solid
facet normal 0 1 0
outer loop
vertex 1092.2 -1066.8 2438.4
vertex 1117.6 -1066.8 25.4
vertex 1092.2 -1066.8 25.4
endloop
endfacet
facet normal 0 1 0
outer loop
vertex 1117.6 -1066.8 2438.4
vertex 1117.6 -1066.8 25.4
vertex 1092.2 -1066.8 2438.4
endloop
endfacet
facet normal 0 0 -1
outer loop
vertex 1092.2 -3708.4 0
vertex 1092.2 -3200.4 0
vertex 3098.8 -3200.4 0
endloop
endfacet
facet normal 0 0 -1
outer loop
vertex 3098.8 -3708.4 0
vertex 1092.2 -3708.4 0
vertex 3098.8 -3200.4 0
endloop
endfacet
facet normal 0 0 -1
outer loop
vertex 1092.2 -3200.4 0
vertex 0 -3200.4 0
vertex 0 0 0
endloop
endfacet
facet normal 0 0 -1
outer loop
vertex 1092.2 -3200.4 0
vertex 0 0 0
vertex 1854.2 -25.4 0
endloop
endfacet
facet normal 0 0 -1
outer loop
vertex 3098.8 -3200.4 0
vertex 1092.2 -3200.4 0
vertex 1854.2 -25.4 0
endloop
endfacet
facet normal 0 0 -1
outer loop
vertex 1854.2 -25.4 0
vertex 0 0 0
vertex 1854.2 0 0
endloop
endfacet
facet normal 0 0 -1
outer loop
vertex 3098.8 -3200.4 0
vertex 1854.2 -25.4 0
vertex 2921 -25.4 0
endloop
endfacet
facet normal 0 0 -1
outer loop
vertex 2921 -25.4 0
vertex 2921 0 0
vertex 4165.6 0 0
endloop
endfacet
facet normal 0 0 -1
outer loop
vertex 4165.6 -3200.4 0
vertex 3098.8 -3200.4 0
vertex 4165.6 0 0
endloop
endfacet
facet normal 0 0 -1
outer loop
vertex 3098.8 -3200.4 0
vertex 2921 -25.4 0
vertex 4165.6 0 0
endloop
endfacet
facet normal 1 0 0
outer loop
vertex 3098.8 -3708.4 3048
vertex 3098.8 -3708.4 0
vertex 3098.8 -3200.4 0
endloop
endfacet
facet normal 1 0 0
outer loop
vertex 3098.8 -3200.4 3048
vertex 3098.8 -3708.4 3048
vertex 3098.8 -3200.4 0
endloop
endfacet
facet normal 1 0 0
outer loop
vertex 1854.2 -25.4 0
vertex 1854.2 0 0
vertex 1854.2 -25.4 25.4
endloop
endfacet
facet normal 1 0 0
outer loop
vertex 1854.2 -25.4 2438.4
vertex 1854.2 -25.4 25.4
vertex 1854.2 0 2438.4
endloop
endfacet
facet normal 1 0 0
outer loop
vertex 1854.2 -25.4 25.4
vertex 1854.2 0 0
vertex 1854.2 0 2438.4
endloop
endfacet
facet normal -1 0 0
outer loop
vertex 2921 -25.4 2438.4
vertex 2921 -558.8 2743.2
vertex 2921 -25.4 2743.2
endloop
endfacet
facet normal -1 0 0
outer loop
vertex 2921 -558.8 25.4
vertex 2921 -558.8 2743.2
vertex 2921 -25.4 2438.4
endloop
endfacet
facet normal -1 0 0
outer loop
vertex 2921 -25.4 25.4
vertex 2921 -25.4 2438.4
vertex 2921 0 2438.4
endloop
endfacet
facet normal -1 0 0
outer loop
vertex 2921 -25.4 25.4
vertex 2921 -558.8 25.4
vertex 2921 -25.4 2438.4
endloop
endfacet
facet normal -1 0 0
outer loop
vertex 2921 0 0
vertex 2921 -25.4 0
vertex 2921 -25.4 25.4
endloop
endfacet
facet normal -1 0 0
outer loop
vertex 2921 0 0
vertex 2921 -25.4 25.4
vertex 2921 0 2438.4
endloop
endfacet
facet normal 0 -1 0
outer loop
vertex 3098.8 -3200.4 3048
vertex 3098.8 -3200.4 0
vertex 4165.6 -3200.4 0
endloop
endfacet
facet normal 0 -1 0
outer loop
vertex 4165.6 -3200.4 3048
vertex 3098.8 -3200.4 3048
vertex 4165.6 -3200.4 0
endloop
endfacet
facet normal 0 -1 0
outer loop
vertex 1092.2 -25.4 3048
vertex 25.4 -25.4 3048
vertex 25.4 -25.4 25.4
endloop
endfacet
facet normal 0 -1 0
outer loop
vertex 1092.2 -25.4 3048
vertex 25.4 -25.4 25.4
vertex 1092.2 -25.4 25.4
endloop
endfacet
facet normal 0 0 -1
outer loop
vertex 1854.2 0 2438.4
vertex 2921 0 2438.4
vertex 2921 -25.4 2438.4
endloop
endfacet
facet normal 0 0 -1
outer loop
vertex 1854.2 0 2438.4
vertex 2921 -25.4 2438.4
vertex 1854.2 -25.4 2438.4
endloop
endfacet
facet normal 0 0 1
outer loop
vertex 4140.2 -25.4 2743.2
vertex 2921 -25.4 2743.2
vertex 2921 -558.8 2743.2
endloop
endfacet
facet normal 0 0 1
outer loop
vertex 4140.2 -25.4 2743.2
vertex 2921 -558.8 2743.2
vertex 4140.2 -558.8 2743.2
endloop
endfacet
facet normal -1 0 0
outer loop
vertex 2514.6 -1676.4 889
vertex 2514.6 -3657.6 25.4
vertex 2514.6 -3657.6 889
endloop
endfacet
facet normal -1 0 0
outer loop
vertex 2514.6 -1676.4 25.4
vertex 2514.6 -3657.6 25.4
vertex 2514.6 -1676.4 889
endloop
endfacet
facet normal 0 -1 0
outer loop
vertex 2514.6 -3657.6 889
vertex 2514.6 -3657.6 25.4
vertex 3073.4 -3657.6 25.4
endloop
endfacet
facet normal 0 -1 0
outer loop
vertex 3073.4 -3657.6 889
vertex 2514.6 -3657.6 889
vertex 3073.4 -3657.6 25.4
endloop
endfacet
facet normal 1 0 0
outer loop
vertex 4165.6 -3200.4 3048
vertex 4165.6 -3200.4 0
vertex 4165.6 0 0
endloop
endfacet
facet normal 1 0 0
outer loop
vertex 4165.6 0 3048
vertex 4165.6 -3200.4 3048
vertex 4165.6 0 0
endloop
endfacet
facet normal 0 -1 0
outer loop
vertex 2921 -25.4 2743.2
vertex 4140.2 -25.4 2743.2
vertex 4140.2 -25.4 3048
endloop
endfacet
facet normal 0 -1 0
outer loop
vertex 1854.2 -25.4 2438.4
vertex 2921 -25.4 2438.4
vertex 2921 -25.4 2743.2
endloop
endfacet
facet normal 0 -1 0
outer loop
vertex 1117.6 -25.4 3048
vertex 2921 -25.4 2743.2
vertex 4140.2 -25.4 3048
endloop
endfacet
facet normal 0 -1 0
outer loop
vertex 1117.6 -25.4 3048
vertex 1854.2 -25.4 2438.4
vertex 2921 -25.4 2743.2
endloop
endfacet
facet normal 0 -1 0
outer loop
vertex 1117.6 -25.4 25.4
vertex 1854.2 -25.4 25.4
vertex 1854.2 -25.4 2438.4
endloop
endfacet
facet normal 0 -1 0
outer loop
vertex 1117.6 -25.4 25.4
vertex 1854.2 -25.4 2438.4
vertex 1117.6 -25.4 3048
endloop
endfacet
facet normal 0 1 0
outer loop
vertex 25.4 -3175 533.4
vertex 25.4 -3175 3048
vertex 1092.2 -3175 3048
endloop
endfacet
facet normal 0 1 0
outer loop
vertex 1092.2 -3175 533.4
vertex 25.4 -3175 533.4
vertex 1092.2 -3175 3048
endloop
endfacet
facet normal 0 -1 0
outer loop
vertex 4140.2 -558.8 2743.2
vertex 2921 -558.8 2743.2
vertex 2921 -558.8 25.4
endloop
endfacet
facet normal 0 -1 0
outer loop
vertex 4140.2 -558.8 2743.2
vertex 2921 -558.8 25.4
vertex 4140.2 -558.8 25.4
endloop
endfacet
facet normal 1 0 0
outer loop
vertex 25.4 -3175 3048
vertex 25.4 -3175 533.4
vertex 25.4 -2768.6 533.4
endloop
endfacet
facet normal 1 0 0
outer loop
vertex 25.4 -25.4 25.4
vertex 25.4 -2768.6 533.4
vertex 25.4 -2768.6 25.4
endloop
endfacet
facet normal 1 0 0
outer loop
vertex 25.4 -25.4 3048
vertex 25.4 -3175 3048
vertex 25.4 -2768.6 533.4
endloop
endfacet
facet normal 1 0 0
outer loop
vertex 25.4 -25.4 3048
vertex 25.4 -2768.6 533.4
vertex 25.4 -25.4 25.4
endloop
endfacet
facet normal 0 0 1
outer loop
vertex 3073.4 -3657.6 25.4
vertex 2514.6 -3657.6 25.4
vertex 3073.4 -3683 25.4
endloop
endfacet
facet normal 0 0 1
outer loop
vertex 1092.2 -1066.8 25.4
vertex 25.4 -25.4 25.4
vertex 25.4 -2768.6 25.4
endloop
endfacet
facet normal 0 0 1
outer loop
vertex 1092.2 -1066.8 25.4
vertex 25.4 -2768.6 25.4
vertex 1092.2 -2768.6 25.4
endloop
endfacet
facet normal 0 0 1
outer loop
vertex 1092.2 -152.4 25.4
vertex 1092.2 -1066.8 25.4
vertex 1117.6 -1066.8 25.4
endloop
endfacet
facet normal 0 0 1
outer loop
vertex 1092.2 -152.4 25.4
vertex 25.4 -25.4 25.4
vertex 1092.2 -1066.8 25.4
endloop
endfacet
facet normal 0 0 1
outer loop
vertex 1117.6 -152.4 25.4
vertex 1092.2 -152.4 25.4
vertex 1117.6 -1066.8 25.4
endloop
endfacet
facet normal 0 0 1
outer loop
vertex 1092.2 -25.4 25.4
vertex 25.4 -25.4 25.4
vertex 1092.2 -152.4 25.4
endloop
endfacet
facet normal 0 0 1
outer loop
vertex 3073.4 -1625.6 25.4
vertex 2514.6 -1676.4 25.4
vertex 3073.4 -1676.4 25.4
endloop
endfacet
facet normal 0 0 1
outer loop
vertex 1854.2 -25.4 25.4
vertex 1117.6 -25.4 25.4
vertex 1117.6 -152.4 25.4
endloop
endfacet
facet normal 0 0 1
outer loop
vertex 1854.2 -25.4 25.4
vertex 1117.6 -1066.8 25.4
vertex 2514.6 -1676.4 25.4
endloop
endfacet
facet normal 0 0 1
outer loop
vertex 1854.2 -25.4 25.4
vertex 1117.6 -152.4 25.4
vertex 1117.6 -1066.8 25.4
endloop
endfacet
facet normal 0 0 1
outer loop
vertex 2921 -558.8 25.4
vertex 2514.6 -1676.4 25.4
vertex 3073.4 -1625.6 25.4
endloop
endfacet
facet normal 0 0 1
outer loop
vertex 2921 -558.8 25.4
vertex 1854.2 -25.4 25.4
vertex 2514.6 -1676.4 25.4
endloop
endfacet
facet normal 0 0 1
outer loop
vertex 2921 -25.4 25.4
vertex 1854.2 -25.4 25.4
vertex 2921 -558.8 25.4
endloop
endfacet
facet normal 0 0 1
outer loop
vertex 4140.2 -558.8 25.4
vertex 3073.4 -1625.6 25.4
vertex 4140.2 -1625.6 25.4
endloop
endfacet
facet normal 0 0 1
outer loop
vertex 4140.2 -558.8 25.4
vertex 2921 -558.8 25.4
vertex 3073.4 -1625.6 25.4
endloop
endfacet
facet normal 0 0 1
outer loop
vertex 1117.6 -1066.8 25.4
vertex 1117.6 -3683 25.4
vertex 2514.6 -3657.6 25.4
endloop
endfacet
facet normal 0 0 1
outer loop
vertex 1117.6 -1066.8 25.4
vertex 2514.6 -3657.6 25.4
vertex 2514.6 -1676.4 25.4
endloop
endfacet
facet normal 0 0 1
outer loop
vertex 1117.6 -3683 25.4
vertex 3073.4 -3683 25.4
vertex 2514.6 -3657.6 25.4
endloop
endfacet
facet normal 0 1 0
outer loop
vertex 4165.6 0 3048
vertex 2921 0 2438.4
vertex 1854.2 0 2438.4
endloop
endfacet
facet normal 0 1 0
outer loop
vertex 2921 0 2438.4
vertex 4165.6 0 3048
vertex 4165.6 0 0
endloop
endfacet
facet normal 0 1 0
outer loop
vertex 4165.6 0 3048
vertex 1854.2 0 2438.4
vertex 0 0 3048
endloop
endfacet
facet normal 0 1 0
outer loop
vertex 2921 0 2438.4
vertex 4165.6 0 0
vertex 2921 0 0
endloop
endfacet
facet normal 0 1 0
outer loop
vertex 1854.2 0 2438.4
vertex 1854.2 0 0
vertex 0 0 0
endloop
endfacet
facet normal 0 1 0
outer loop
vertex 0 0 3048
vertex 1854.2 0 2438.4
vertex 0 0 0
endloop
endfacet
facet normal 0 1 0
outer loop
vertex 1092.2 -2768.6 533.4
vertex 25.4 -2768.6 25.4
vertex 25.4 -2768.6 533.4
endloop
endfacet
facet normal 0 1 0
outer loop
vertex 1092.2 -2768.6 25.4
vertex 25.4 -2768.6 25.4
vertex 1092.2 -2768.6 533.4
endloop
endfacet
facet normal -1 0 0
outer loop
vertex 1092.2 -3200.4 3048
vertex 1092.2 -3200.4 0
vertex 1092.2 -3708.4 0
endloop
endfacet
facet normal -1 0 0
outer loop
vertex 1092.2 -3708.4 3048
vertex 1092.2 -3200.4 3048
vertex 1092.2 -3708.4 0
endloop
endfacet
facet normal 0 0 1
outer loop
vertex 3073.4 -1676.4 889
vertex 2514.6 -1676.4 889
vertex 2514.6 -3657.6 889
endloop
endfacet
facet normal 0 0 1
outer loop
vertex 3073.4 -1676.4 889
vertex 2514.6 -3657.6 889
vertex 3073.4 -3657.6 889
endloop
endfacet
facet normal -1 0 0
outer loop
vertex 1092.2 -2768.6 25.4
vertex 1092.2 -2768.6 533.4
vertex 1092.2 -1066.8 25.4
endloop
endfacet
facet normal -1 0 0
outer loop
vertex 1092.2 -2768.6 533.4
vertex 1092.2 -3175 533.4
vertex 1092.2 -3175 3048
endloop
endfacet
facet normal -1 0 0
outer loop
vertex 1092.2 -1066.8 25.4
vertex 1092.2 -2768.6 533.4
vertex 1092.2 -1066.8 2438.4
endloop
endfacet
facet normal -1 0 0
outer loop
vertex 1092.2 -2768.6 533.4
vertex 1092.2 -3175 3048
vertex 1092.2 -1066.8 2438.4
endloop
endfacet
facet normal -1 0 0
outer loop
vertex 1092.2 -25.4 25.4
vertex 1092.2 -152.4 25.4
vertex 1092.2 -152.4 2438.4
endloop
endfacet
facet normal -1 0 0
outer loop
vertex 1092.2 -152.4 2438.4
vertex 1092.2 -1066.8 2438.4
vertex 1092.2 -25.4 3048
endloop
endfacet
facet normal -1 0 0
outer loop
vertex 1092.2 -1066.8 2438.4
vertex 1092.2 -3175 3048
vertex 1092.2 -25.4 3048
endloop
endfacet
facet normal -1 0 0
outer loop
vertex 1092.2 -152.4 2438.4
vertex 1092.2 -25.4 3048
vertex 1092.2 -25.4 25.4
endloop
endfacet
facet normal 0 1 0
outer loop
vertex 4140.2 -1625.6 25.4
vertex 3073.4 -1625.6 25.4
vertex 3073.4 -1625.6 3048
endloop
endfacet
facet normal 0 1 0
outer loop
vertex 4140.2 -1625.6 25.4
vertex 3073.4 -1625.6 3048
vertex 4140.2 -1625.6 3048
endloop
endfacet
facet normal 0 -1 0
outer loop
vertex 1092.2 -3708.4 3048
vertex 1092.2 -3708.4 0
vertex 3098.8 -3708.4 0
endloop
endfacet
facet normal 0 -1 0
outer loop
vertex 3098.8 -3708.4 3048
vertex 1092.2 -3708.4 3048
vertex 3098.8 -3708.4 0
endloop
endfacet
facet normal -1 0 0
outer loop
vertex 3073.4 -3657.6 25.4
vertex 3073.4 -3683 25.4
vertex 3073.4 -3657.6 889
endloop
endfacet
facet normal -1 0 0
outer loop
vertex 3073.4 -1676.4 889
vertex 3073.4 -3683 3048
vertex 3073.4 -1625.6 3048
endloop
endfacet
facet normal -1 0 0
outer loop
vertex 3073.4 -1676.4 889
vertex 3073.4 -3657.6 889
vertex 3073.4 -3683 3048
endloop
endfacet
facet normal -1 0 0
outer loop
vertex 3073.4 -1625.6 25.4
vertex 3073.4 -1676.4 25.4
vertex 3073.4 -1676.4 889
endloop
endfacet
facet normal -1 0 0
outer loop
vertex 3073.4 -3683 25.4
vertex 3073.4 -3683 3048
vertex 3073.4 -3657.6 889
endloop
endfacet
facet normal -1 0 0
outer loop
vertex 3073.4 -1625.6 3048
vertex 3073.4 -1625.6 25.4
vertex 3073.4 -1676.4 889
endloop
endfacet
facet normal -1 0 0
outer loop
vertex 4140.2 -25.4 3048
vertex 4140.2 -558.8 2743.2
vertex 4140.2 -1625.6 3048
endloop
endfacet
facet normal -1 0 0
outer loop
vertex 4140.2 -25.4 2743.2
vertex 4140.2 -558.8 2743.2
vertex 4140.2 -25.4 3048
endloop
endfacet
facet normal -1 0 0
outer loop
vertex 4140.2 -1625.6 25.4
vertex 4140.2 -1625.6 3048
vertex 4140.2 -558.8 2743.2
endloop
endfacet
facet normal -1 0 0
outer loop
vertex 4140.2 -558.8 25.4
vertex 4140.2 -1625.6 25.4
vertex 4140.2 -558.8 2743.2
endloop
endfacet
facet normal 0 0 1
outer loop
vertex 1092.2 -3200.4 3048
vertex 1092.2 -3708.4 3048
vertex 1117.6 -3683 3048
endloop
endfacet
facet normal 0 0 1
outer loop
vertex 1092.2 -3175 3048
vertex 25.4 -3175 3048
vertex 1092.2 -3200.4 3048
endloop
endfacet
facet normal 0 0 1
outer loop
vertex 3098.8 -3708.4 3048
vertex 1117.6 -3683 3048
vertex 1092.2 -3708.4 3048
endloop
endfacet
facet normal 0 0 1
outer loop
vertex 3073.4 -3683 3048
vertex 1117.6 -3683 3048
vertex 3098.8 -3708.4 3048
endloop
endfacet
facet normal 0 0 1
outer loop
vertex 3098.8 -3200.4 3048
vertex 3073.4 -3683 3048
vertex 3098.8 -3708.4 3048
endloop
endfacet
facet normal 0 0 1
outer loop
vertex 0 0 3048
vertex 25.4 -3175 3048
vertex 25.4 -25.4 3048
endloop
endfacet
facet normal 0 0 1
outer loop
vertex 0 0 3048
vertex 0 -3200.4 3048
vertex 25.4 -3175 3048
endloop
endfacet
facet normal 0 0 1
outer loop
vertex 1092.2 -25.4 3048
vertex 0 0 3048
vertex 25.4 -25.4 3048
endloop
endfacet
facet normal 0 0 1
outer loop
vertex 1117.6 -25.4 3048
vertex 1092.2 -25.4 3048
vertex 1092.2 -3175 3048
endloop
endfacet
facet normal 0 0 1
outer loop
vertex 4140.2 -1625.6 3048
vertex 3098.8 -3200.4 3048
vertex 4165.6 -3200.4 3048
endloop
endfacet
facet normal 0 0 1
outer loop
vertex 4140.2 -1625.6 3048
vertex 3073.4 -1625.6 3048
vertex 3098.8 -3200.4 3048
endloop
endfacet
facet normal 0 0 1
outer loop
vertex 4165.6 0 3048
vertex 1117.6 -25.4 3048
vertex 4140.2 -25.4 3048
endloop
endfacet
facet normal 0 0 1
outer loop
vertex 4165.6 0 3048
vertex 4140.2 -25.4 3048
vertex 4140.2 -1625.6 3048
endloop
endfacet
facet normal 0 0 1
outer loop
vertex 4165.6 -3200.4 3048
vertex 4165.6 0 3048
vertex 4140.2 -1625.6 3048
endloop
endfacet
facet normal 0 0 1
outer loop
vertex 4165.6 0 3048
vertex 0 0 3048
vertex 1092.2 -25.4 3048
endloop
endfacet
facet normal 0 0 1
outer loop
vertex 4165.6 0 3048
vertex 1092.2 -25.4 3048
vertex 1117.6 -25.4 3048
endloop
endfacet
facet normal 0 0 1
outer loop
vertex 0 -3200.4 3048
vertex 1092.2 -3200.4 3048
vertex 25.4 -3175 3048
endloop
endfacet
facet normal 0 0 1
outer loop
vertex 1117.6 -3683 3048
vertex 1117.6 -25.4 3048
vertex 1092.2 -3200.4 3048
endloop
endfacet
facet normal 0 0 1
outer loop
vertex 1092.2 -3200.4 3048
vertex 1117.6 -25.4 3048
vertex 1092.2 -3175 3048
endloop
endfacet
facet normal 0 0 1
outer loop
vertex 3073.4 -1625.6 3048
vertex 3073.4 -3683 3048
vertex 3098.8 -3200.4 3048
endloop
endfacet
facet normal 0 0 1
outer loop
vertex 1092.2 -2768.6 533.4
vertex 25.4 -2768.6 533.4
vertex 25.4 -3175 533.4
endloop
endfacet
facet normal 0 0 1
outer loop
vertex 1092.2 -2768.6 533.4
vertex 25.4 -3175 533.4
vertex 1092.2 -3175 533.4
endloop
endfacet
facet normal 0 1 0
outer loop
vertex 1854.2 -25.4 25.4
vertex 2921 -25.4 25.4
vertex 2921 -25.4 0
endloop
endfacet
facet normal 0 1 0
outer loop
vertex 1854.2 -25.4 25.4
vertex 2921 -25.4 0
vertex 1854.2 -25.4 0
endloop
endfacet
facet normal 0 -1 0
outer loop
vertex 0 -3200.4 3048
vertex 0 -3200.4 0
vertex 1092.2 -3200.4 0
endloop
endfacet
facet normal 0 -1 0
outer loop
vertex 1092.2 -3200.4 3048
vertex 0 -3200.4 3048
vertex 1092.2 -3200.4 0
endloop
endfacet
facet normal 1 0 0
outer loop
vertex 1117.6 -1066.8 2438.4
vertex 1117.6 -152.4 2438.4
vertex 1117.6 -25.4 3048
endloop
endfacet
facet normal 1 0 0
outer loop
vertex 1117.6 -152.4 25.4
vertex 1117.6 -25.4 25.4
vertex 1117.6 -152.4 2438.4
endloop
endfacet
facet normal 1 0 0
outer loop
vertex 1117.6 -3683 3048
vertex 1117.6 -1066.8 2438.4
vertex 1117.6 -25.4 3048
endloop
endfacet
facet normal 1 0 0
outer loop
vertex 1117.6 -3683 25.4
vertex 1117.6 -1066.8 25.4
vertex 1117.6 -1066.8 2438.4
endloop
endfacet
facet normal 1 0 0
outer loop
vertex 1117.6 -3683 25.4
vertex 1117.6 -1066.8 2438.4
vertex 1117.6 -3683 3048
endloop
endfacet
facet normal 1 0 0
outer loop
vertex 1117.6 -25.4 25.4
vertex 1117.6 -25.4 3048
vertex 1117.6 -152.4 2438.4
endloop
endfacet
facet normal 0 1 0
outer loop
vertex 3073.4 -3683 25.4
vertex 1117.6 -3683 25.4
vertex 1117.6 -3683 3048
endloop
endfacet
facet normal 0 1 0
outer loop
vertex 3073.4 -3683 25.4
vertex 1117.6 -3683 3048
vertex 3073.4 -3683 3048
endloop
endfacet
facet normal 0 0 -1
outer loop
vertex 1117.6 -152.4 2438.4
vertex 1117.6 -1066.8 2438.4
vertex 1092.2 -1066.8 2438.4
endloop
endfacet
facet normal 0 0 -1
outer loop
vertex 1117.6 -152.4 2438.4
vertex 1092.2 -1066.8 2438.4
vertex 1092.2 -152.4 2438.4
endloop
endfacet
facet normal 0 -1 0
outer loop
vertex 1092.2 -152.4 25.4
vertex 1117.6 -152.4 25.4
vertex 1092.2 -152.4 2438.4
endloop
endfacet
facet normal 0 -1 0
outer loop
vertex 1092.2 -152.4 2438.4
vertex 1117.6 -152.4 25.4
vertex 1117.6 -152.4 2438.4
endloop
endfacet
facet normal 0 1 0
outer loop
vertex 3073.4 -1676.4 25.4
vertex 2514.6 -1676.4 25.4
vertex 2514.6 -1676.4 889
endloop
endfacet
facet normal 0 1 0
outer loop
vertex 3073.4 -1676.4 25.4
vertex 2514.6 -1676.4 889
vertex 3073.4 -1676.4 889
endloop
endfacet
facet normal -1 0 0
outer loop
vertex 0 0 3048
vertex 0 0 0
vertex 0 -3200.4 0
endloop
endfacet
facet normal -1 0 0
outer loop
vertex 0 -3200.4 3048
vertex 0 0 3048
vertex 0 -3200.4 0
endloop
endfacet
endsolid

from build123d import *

# Parameters (mm, degrees)
F5_DEPTH  = 3048
F7_T      = -25.4
F6_W      = 1066.8
F6_H      = 2438.4
F8_DEPTH  = 25.4
F1_W      = 1117.6
F1_H      = 3200.4
F9_DEPTH  = 3048
F2_W      = 1092.2
F2_H      = 1574.8
F10_DEPTH = 3048
F4_W      = 558.8
F4_H      = 1981.2
F11_DEPTH = 889
F3_W      = 1244.6
F3_H      = 558.8
F12_DEPTH = 508
F13_W     = 1219.2
F13_H     = 533.4
F14_DEPTH = 2235.2
F16_W     = 1066.8
F16_H     = 3149.6
F17_DEPTH = 3022.6
F15_W     = 914.4
F15_H     = 2413
F18_DEPTH = 25.4
F19_W     = 1066.8
F19_H     = 406.4
F20_DEPTH = 508


with BuildPart() as f5:
    # F0 (on Top) → F5 (new body)
    with BuildSketch(Plane.XY):
        Polygon((4165.6, 0), (0, 0), (0, -3200.4), (1092.2, -3200.4), (1092.2, -3708.4), (3098.8, -3708.4), (3098.8, -3200.4), (4165.6, -3200.4), align=None)
    extrude(amount=F5_DEPTH)

    # F7
    f7_openings = [f5.faces().sort_by_distance(p)[0] for p in [
        (2083.702086, -1731.90455, 3048),
    ]]
    offset(amount=F7_T, openings=f7_openings, kind=Kind.INTERSECTION)

    # F6 (on face) → F8 (cut, through all)
    with BuildSketch(Plane(origin=(0, 0, 0), x_dir=(-1, 0, 0), z_dir=(0, 1, 0))):
        with Locations((-2387.6, 1219.2)):
            Rectangle(F6_W, F6_H)
    extrude(amount=-F8_DEPTH, mode=Mode.SUBTRACT)

    # F1 (on face) → F9 (join)
    with BuildSketch(Plane.XY):
        with Locations((558.8, -1600.2)):
            Rectangle(F1_W, F1_H)
    extrude(amount=F9_DEPTH)

    # F2 (on face) → F10 (join)
    with BuildSketch(Plane.XY):
        with Locations((3619.5, -2413)):
            Rectangle(F2_W, F2_H)
    extrude(amount=F10_DEPTH)

    # F4 (on Top) → F11 (join)
    with BuildSketch(Plane.XY):
        with Locations((2794, -2667)):
            Rectangle(F4_W, F4_H)
    extrude(amount=F11_DEPTH)

    # F3 (on face) → F12 (join)
    with BuildSketch(Plane.XY):
        with Locations((3543.3, -279.4)):
            Rectangle(F3_W, F3_H)
    extrude(amount=F12_DEPTH)

    # F13 (on face) → F14 (join)
    with BuildSketch(Plane.XY.offset(508)):
        with Locations((3530.6, -292.1)):
            Rectangle(F13_W, F13_H)
    extrude(amount=F14_DEPTH)

    # F16 (on face) → F17 (cut)
    with BuildSketch(Plane.XY.offset(3048)):
        with Locations((558.8, -1600.2)):
            Rectangle(F16_W, F16_H)
    extrude(amount=-F17_DEPTH, mode=Mode.SUBTRACT)

    # F15 (on face) → F18 (cut)
    with BuildSketch(Plane.YZ.offset(1117.6)):
        with Locations((-609.6, 1231.9)):
            Rectangle(F15_W, F15_H)
    extrude(amount=-F18_DEPTH, mode=Mode.SUBTRACT)

    # F19 (on face) → F20 (join)
    with BuildSketch(Plane.XY.offset(25.4)):
        with Locations((558.8, -2971.8)):
            Rectangle(F19_W, F19_H)
    extrude(amount=F20_DEPTH)


solid = f5.part
